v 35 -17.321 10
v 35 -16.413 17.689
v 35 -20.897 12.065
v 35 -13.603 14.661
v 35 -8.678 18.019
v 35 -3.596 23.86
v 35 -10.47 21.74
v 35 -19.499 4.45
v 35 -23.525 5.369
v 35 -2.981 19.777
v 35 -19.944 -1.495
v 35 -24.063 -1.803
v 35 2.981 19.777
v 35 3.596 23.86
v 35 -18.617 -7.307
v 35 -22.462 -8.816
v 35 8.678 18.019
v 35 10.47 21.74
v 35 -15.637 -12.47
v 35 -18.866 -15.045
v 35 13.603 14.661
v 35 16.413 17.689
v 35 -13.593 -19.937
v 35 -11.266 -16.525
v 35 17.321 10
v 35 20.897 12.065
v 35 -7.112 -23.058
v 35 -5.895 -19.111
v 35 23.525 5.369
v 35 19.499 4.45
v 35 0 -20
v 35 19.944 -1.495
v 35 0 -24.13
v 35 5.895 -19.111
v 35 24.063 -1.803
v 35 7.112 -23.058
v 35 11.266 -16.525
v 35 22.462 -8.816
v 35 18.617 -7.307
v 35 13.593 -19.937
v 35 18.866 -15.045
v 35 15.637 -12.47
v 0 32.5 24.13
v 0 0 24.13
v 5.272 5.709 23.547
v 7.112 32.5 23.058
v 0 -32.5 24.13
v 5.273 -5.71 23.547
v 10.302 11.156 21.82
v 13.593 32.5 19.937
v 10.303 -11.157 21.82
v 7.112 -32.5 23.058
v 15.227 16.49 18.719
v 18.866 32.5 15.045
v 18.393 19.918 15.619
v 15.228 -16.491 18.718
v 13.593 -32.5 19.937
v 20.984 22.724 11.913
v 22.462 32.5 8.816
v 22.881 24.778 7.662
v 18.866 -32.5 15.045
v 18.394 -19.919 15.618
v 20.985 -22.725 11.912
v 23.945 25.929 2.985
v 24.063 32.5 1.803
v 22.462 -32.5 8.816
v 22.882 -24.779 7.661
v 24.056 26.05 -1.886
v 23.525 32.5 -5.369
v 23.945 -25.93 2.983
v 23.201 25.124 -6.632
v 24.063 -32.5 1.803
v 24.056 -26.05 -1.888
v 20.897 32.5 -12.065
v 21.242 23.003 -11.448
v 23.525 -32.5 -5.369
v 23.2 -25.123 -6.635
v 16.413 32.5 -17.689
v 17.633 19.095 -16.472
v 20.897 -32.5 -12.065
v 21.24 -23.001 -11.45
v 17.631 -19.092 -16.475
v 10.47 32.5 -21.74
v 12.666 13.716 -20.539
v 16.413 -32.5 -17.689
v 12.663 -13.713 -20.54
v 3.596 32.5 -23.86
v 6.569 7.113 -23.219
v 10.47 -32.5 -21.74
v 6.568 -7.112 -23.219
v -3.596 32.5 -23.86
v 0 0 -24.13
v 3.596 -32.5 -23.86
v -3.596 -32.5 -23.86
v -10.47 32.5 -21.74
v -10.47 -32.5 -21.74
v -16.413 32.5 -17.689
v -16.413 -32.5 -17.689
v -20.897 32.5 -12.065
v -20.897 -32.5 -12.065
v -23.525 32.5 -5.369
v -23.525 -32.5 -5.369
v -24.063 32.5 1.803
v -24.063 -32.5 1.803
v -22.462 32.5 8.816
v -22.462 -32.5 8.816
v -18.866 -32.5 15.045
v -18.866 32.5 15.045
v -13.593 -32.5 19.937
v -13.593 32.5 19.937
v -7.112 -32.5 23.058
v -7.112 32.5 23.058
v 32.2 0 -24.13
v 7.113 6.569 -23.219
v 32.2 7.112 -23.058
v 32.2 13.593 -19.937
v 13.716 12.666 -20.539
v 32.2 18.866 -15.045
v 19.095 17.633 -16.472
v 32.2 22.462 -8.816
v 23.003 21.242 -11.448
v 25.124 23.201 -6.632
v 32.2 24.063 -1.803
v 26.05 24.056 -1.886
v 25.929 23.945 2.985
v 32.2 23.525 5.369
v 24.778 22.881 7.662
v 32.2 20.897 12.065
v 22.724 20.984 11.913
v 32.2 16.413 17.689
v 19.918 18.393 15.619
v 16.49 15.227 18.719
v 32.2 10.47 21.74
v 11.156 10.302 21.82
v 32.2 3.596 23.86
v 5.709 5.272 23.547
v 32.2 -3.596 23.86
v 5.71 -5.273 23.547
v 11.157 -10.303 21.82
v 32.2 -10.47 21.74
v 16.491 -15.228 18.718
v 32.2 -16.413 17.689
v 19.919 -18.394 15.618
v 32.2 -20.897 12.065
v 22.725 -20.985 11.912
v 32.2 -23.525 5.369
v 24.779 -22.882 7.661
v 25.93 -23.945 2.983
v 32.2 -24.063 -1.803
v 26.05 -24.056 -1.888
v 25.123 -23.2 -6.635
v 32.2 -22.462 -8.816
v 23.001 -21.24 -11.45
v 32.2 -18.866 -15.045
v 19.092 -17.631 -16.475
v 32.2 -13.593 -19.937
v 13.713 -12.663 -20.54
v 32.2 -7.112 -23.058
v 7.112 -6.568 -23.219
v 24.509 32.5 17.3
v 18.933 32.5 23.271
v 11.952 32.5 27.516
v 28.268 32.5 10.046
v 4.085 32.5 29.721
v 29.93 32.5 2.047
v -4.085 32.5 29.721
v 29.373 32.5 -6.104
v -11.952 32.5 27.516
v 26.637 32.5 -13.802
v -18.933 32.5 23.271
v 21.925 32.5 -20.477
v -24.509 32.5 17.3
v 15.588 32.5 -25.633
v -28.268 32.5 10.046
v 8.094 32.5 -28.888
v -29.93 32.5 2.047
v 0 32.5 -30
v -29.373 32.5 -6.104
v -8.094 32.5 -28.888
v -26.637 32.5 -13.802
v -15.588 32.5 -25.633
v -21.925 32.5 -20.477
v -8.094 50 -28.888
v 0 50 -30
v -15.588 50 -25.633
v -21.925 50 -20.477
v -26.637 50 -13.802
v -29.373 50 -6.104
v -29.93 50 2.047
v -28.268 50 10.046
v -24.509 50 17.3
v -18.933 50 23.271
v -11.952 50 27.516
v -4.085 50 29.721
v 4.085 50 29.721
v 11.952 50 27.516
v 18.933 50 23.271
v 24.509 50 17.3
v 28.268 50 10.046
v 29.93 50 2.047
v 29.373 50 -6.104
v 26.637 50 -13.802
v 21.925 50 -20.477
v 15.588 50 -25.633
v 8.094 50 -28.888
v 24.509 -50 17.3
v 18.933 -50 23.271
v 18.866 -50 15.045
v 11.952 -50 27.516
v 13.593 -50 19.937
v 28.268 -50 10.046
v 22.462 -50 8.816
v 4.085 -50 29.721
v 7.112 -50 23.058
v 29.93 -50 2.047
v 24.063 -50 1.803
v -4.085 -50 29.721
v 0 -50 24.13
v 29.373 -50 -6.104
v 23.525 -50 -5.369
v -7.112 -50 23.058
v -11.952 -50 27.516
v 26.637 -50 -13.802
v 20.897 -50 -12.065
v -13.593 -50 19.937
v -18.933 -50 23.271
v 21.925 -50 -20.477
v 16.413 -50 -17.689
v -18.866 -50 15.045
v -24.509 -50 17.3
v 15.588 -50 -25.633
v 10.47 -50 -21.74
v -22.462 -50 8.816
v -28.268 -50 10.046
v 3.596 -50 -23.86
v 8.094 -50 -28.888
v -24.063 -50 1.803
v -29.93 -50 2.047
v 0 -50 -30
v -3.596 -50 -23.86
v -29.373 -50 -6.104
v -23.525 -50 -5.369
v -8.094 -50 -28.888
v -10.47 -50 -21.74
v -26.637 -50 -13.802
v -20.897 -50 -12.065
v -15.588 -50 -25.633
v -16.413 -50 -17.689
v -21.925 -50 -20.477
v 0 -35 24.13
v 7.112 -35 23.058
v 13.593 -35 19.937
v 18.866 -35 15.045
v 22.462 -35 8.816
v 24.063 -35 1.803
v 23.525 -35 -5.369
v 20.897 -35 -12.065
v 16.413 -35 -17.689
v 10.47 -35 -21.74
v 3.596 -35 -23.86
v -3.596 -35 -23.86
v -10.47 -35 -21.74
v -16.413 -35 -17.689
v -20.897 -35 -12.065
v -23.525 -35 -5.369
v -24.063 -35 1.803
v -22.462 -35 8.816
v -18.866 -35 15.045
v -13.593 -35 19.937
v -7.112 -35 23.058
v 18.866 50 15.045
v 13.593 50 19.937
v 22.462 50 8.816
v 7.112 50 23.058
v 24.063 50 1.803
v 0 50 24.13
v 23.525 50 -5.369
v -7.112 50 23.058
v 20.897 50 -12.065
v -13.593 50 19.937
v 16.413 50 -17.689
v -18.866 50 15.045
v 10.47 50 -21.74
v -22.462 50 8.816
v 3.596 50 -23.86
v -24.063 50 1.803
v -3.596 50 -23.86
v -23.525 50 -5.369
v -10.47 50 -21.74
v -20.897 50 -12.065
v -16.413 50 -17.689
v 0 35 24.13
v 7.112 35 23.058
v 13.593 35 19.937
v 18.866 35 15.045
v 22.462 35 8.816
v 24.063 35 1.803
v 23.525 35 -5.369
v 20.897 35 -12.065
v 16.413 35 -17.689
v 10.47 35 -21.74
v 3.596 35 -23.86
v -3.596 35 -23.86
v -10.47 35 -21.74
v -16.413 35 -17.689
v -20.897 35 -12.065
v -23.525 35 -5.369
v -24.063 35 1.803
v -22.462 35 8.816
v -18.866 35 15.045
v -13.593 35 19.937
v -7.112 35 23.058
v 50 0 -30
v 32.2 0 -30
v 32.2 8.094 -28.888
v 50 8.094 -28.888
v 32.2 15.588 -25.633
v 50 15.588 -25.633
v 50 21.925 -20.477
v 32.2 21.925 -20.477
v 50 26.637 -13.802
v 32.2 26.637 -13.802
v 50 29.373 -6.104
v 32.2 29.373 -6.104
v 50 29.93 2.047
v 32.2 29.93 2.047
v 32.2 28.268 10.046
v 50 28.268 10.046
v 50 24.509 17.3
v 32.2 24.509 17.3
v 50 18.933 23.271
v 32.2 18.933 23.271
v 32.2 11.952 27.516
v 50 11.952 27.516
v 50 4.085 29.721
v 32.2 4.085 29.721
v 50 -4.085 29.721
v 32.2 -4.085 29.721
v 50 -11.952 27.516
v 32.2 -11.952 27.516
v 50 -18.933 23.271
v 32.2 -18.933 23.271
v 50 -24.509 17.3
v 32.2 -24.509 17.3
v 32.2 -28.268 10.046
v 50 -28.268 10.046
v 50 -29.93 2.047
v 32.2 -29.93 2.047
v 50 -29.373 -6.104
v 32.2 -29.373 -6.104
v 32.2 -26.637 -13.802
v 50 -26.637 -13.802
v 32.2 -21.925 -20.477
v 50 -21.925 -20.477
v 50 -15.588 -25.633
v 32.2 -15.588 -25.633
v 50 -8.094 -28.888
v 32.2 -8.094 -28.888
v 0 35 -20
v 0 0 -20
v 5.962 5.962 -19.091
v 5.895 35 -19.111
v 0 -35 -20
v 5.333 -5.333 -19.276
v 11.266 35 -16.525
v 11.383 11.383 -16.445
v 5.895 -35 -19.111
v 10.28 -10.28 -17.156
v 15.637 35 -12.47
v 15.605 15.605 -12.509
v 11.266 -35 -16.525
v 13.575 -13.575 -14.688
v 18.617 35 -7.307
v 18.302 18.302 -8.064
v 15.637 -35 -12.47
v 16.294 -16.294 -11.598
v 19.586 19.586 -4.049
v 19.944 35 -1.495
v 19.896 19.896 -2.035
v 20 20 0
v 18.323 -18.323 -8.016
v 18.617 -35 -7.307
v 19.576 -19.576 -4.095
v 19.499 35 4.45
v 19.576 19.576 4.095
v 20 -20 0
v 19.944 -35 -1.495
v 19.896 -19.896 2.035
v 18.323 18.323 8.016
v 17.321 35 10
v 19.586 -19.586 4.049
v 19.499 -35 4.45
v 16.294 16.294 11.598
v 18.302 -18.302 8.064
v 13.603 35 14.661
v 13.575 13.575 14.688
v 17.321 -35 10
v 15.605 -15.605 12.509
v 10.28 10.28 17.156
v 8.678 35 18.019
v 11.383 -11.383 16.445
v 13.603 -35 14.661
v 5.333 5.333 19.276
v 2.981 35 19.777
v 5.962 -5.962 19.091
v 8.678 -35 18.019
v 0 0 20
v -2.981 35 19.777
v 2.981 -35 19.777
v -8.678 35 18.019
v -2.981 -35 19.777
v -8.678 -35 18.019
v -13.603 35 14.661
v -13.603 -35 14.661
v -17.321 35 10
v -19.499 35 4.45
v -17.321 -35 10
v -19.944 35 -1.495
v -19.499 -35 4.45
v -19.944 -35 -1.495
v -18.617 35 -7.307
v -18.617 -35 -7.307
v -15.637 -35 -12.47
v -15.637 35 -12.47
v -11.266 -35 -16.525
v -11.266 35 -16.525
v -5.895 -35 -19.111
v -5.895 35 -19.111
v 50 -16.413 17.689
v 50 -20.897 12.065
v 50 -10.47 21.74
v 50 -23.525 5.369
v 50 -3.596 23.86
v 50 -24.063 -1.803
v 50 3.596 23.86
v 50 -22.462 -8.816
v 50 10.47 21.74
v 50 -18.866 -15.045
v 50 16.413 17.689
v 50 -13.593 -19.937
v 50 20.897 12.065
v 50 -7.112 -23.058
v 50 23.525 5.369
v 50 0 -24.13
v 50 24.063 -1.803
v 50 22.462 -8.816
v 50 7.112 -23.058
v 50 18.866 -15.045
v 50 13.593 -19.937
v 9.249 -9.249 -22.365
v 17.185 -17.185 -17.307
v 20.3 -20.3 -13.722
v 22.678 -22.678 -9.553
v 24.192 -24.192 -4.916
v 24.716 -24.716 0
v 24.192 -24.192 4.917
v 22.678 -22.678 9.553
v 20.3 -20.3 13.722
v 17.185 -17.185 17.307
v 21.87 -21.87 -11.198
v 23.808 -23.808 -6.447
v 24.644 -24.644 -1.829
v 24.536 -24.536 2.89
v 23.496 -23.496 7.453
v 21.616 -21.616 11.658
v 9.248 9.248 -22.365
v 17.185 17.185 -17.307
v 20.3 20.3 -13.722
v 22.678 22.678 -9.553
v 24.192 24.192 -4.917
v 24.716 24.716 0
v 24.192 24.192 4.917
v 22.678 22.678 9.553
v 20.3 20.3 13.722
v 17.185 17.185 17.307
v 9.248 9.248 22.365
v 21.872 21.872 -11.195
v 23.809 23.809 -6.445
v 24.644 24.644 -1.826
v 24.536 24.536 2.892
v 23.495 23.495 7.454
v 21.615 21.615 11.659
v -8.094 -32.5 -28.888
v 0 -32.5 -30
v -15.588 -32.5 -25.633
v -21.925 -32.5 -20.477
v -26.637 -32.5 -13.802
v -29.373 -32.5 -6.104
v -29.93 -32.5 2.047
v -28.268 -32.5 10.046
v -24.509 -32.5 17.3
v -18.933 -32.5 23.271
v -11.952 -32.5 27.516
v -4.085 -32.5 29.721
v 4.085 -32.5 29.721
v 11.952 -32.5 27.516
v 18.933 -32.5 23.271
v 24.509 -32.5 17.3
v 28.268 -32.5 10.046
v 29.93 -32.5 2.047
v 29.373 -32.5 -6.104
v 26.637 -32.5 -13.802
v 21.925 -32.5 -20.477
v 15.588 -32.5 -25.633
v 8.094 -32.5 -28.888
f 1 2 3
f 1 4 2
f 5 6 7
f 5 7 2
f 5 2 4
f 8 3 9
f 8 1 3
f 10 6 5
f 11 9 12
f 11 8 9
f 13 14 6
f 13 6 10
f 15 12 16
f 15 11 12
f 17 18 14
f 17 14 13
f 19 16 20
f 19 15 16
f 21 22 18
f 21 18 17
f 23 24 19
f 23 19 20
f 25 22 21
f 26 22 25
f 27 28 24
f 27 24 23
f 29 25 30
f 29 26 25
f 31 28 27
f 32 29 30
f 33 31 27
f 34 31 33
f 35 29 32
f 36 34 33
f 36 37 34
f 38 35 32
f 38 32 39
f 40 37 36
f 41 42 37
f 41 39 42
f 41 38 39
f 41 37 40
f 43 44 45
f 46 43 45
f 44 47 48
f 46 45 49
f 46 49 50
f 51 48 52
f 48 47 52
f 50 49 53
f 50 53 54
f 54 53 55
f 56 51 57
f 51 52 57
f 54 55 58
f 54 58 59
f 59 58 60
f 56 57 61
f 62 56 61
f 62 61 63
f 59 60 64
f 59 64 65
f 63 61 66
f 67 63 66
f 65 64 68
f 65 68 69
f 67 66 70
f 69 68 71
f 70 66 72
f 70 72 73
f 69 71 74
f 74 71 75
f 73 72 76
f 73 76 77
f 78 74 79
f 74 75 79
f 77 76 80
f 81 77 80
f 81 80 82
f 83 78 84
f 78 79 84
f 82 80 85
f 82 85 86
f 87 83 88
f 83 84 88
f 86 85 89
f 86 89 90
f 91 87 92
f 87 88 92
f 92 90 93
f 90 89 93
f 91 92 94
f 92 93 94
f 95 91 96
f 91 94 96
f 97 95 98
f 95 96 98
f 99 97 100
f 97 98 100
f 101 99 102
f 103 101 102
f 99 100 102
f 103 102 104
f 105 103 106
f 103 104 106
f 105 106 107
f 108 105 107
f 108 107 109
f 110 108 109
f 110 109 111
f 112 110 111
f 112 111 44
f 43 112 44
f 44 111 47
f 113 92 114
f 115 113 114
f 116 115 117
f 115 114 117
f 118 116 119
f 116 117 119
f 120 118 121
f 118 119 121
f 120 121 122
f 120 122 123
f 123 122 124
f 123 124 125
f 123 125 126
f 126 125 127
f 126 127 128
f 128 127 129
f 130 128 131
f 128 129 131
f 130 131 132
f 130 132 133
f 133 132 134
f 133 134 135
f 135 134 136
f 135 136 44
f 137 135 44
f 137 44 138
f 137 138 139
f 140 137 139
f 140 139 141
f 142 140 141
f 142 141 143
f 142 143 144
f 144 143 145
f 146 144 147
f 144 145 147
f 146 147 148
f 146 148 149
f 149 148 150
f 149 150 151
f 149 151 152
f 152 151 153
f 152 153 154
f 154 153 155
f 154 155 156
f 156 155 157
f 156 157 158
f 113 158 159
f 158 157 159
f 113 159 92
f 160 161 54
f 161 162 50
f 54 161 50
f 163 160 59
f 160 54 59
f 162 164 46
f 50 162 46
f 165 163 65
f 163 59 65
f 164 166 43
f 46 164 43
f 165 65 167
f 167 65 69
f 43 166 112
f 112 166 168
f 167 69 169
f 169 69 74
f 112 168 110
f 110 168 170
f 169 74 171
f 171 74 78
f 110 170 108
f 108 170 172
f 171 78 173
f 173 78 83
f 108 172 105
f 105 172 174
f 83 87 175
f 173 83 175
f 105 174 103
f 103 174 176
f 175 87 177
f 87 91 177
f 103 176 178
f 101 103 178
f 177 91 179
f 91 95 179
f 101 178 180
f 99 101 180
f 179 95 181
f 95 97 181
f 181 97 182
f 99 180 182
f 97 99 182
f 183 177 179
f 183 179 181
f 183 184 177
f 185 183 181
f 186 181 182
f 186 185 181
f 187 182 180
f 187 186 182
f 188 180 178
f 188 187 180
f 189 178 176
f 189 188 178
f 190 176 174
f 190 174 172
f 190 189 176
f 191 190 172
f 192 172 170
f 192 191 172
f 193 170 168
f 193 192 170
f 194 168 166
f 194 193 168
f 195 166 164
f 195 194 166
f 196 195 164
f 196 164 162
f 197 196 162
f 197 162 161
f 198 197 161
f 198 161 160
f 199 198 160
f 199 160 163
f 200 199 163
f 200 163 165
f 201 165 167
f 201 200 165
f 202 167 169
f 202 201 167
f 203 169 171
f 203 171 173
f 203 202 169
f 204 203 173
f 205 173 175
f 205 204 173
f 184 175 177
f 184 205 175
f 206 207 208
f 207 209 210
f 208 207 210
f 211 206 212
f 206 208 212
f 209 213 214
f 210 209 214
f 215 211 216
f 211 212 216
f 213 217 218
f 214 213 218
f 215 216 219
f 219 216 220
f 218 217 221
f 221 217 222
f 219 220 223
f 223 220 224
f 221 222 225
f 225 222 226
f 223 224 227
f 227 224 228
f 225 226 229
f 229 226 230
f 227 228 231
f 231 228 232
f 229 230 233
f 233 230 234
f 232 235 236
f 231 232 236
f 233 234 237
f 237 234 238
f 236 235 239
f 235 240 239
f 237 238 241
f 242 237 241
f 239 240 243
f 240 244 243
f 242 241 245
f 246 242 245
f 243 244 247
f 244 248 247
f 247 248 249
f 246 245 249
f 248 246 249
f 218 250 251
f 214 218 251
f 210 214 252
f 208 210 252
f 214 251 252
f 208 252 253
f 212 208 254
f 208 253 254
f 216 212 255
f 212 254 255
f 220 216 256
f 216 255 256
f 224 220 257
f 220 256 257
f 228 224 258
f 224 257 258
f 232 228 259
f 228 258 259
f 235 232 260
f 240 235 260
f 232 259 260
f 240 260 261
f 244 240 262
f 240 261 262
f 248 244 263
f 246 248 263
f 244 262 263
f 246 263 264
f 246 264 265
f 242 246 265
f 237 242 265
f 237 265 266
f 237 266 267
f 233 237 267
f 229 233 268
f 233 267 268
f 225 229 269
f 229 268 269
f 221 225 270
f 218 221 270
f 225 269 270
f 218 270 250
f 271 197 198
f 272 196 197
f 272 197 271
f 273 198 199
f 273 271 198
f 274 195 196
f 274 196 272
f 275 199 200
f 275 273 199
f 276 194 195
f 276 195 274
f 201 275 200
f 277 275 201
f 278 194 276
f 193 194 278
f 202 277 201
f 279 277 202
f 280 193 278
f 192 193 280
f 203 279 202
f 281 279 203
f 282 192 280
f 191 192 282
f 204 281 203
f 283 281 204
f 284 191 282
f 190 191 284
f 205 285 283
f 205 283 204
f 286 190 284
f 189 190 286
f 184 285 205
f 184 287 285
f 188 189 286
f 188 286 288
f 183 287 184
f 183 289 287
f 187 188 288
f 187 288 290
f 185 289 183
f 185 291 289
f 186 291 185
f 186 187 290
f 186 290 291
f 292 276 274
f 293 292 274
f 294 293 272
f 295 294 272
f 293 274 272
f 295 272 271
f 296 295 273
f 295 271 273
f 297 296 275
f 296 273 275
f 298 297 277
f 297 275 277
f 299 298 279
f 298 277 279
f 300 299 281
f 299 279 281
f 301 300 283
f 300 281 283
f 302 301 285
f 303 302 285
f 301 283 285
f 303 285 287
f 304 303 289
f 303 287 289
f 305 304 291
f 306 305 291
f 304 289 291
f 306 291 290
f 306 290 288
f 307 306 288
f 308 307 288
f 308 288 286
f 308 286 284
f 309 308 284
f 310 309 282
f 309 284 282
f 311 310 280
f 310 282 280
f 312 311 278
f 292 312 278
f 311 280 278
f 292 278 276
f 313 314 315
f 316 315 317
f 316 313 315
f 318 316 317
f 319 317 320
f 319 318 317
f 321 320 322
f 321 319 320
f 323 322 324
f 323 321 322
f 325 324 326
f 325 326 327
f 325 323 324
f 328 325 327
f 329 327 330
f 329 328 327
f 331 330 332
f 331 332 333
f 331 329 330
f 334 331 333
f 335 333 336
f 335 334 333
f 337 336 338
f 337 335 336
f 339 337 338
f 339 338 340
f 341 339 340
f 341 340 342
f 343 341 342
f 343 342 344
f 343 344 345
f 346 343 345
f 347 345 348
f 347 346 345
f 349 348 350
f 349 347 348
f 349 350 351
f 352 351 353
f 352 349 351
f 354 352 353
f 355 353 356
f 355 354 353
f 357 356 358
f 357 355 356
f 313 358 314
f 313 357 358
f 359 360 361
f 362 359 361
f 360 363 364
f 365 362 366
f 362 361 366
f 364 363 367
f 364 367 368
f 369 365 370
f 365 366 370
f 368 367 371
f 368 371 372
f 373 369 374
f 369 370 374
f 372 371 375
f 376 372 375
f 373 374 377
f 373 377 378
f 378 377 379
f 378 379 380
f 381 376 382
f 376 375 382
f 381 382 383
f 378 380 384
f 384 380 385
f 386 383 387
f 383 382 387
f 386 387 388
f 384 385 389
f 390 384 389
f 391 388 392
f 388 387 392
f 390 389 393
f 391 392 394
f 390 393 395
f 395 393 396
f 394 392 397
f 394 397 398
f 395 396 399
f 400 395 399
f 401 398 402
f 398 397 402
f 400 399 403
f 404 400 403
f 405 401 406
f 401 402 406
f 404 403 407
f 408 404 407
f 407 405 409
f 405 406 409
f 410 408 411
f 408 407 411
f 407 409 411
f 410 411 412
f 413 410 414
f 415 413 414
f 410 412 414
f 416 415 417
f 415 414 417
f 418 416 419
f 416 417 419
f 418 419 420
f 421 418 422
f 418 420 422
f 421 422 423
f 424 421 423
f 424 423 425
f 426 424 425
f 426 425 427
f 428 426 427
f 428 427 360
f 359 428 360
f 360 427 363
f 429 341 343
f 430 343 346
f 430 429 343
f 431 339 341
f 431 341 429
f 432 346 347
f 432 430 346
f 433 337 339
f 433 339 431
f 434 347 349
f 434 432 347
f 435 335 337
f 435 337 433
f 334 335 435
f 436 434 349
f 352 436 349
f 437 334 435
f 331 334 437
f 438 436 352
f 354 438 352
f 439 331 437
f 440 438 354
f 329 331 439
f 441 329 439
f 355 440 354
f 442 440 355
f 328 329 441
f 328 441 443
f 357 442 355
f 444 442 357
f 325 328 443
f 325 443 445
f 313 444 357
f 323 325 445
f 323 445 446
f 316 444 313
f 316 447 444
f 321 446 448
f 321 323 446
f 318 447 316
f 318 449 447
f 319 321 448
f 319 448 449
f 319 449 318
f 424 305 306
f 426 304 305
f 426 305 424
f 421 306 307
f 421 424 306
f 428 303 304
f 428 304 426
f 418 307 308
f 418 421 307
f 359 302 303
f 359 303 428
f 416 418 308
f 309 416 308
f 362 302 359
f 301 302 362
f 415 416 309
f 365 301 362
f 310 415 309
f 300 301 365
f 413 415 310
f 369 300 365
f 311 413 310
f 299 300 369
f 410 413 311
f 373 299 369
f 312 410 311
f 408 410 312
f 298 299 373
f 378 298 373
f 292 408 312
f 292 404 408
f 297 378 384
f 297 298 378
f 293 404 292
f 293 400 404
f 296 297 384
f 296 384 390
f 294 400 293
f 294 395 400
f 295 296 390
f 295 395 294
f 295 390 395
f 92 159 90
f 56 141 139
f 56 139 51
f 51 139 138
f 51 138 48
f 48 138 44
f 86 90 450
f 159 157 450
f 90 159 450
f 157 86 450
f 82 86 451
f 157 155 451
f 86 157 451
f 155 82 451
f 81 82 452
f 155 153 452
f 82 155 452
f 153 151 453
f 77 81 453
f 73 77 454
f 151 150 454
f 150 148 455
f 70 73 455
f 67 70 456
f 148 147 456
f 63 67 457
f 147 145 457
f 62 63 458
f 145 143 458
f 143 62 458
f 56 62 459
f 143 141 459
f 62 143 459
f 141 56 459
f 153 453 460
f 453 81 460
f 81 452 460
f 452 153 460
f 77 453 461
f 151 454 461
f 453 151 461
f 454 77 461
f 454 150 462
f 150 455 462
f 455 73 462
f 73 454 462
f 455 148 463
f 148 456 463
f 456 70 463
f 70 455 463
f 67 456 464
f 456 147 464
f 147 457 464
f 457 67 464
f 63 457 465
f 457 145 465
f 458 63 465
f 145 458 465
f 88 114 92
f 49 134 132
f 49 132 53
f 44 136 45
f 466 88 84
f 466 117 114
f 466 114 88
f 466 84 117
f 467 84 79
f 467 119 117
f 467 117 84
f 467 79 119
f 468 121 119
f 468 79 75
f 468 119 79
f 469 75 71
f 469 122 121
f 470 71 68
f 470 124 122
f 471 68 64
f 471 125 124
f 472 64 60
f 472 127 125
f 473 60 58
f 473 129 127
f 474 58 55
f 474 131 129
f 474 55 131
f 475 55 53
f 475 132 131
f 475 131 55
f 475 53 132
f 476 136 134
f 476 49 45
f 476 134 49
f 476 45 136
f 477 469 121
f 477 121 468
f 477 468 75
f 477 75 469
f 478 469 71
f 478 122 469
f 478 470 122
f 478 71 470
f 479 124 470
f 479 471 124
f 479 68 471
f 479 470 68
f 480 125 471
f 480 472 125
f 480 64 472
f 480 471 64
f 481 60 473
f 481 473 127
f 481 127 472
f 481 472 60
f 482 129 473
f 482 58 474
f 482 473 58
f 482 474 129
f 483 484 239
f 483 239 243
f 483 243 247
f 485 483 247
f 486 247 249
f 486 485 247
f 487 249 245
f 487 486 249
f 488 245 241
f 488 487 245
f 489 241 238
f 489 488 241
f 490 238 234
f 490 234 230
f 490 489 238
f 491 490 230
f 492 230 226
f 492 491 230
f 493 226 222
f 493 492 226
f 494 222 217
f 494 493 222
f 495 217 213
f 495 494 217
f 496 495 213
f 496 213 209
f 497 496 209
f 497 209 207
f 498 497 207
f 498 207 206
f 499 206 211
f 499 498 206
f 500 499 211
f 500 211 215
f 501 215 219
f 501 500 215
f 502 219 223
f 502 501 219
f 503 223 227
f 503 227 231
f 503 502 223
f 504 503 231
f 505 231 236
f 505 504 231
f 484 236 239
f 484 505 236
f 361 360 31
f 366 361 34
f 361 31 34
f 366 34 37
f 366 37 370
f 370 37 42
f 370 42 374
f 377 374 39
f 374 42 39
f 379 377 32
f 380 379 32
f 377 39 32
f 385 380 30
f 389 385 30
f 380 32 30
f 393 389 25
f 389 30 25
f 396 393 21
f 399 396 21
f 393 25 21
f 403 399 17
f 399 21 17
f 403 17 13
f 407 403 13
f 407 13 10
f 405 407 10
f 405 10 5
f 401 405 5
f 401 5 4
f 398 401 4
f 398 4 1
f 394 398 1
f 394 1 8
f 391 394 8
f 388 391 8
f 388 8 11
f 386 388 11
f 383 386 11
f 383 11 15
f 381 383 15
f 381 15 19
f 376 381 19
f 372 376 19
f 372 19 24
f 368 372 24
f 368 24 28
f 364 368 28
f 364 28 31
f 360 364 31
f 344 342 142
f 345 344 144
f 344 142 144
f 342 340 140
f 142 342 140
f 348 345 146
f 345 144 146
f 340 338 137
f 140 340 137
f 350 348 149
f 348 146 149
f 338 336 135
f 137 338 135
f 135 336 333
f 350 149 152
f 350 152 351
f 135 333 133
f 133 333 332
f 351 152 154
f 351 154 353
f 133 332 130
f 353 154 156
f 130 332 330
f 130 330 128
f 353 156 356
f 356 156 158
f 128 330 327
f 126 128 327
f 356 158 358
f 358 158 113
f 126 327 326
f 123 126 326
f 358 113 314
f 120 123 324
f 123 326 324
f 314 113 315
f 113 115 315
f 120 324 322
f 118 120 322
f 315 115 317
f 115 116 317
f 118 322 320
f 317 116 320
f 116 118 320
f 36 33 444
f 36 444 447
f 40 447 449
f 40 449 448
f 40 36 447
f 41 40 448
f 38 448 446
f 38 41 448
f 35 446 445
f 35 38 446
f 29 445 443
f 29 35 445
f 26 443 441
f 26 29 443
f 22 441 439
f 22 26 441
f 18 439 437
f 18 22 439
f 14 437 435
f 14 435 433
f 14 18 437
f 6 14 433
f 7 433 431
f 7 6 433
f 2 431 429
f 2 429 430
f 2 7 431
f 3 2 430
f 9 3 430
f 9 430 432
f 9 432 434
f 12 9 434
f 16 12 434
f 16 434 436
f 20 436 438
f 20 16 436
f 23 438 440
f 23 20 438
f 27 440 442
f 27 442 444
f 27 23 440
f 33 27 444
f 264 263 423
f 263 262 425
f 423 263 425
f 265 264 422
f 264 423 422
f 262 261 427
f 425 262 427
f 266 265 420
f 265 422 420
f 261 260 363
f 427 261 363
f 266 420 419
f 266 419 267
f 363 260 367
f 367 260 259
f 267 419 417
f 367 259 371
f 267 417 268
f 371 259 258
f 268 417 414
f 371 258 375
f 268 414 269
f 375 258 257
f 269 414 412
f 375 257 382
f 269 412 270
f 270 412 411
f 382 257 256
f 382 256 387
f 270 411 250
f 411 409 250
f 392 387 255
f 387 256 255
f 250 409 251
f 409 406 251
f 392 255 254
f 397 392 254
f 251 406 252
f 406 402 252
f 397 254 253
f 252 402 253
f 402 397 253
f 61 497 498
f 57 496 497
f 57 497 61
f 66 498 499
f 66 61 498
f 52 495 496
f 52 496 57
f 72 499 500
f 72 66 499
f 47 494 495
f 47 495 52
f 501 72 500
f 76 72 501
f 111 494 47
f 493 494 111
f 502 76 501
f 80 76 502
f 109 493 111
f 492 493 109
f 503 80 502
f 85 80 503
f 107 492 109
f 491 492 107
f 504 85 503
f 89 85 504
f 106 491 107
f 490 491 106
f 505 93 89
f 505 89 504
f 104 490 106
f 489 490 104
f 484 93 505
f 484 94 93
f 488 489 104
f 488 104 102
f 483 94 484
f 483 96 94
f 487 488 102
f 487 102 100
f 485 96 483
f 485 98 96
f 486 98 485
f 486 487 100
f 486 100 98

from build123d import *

# Parameters (mm, degrees)
CROQUIS1_R                 = 30
SALIENTE_EXTRUIR1_DEPTH    = 50
CROQUIS3_R                 = 24.13
CORTAR_EXTRUIR1_DEPTH      = 15
CORTAR_EXTRUIR2_START      = -85
CROQUIS3_2_R               = 24.13
CORTAR_EXTRUIR2_DEPTH      = 15
CROQUIS4_R                 = 30
CROQUIS4_R_2               = 24.13
CORTAR_EXTRUIR3_DEPTH      = 32.5
CROQUIS5_R                 = 24.13
SALIENTE_EXTRUIR2_DEPTH    = 50
CROQUIS6_R                 = 30
SALIENTE_EXTRUIR3_DEPTH    = 17.8
CORTAR_EXTRUIR4_START      = -15
CROQUIS7_R                 = 24.13
CORTAR_EXTRUIR4_DEPTH      = 15
CROQUIS9_R                 = 20
CORTAR_EXTRUIR5_DEPTH      = 104.07764064
REDONDEO1_R                = 2
CORTAR_EXTRUIR6_REACH      = 89.321
CORTAR_EXTRUIR6_END_RADIUS = 20
CROQUIS10_R                = 20


with BuildPart() as part:
    # Croquis1 → Saliente-Extruir1 (new, symmetric)
    with BuildSketch(Plane(origin=(0, 0, 0), x_dir=(1, 0, 0), z_dir=(0, 1, 0))):
        with Locations(Location((0, 0, 0), (0, 0, 90))):
            Circle(CROQUIS1_R)
    extrude(amount=SALIENTE_EXTRUIR1_DEPTH, both=True)

    # Croquis3 → Cortar-Extruir1 (cut)
    with BuildSketch(Plane(origin=(0, 50, 0), x_dir=(1, 0, 0), z_dir=(0, 1, 0))):
        with Locations(Location((0, 0, 0), (0, 0, 270))):
            Circle(CROQUIS3_R)
    extrude(amount=-CORTAR_EXTRUIR1_DEPTH, mode=Mode.SUBTRACT)

    # Croquis3<2> → Cortar-Extruir2 (cut)
    with BuildSketch(Plane(origin=(0, 50, 0), x_dir=(1, 0, 0), z_dir=(0, 1, 0)).offset(CORTAR_EXTRUIR2_START)):
        with Locations(Location((0, 0, 0), (0, 0, 270))):
            Circle(CROQUIS3_2_R)
    extrude(amount=-CORTAR_EXTRUIR2_DEPTH, mode=Mode.SUBTRACT)

    # Croquis4 → Cortar-Extruir3 (cut, symmetric)
    with BuildSketch(Plane(origin=(0, 0, 0), x_dir=(1, 0, 0), z_dir=(0, 1, 0))):
        with Locations(Location((0, 0, 0), (0, 0, 90))):
            Circle(CROQUIS4_R)
        with Locations(Location((0, 0, 0), (0, 0, 270))):
            Circle(CROQUIS4_R_2, mode=Mode.SUBTRACT)
    extrude(amount=CORTAR_EXTRUIR3_DEPTH, both=True, mode=Mode.SUBTRACT)

    # Croquis5 → Saliente-Extruir2 (add)
    with BuildSketch(Plane(origin=(0, 0, 0), x_dir=(0, 0, -1), z_dir=(1, 0, 0))):
        Circle(CROQUIS5_R)
    extrude(amount=SALIENTE_EXTRUIR2_DEPTH)

    # Croquis6 → Saliente-Extruir3 (add)
    with BuildSketch(Plane(origin=(50, 0, 0), x_dir=(0, 0, -1), z_dir=(1, 0, 0))):
        Circle(CROQUIS6_R)
    extrude(amount=-SALIENTE_EXTRUIR3_DEPTH)

    # Croquis7 → Cortar-Extruir4 (cut)
    with BuildSketch(Plane(origin=(50, 0, 0), x_dir=(0, 0, -1), z_dir=(1, 0, 0)).offset(CORTAR_EXTRUIR4_START)):
        Circle(CROQUIS7_R)
    extrude(amount=CORTAR_EXTRUIR4_DEPTH, mode=Mode.SUBTRACT)

    # Croquis9 → Cortar-Extruir5 (cut, through all)
    with BuildSketch(Plane.XZ.offset(35)):
        with Locations(Location((0, 0, 0), (0, 0, 270))):
            Circle(CROQUIS9_R)
    extrude(amount=-CORTAR_EXTRUIR5_DEPTH, mode=Mode.SUBTRACT)

    # Redondeo1
    redondeo1_edges = [part.edges().sort_by_distance(p)[0] for p in [
        (15.589160136, -15.589160136, -18.418332885),
        (24.13, 24.13, 2.6592e-05),
    ]]
    fillet(redondeo1_edges, radius=REDONDEO1_R)

    # Cortar-Extruir6: up to this cylinder (the profile starts outside it)
    cortar_extruir6_end = Plane(origin=(0, 0, 0), z_dir=(0, -1, 0)) * Cylinder(CORTAR_EXTRUIR6_END_RADIUS, 219.642, mode=Mode.PRIVATE)
    # Croquis10 → Cortar-Extruir6 (cut, up to the surface)
    with BuildSketch(Plane(origin=(35, 0, 0), x_dir=(0, 0, -1), z_dir=(1, 0, 0)), mode=Mode.PRIVATE) as cortar_extruir6_sk1:
        Circle(CROQUIS10_R)
    cortar_extruir6_tool1 = extrude(cortar_extruir6_sk1.sketch, amount=-CORTAR_EXTRUIR6_REACH, mode=Mode.PRIVATE) - cortar_extruir6_end
    add(cortar_extruir6_tool1.solids().sort_by_distance((35, 0, 0))[0], mode=Mode.SUBTRACT)


solid = part.part
